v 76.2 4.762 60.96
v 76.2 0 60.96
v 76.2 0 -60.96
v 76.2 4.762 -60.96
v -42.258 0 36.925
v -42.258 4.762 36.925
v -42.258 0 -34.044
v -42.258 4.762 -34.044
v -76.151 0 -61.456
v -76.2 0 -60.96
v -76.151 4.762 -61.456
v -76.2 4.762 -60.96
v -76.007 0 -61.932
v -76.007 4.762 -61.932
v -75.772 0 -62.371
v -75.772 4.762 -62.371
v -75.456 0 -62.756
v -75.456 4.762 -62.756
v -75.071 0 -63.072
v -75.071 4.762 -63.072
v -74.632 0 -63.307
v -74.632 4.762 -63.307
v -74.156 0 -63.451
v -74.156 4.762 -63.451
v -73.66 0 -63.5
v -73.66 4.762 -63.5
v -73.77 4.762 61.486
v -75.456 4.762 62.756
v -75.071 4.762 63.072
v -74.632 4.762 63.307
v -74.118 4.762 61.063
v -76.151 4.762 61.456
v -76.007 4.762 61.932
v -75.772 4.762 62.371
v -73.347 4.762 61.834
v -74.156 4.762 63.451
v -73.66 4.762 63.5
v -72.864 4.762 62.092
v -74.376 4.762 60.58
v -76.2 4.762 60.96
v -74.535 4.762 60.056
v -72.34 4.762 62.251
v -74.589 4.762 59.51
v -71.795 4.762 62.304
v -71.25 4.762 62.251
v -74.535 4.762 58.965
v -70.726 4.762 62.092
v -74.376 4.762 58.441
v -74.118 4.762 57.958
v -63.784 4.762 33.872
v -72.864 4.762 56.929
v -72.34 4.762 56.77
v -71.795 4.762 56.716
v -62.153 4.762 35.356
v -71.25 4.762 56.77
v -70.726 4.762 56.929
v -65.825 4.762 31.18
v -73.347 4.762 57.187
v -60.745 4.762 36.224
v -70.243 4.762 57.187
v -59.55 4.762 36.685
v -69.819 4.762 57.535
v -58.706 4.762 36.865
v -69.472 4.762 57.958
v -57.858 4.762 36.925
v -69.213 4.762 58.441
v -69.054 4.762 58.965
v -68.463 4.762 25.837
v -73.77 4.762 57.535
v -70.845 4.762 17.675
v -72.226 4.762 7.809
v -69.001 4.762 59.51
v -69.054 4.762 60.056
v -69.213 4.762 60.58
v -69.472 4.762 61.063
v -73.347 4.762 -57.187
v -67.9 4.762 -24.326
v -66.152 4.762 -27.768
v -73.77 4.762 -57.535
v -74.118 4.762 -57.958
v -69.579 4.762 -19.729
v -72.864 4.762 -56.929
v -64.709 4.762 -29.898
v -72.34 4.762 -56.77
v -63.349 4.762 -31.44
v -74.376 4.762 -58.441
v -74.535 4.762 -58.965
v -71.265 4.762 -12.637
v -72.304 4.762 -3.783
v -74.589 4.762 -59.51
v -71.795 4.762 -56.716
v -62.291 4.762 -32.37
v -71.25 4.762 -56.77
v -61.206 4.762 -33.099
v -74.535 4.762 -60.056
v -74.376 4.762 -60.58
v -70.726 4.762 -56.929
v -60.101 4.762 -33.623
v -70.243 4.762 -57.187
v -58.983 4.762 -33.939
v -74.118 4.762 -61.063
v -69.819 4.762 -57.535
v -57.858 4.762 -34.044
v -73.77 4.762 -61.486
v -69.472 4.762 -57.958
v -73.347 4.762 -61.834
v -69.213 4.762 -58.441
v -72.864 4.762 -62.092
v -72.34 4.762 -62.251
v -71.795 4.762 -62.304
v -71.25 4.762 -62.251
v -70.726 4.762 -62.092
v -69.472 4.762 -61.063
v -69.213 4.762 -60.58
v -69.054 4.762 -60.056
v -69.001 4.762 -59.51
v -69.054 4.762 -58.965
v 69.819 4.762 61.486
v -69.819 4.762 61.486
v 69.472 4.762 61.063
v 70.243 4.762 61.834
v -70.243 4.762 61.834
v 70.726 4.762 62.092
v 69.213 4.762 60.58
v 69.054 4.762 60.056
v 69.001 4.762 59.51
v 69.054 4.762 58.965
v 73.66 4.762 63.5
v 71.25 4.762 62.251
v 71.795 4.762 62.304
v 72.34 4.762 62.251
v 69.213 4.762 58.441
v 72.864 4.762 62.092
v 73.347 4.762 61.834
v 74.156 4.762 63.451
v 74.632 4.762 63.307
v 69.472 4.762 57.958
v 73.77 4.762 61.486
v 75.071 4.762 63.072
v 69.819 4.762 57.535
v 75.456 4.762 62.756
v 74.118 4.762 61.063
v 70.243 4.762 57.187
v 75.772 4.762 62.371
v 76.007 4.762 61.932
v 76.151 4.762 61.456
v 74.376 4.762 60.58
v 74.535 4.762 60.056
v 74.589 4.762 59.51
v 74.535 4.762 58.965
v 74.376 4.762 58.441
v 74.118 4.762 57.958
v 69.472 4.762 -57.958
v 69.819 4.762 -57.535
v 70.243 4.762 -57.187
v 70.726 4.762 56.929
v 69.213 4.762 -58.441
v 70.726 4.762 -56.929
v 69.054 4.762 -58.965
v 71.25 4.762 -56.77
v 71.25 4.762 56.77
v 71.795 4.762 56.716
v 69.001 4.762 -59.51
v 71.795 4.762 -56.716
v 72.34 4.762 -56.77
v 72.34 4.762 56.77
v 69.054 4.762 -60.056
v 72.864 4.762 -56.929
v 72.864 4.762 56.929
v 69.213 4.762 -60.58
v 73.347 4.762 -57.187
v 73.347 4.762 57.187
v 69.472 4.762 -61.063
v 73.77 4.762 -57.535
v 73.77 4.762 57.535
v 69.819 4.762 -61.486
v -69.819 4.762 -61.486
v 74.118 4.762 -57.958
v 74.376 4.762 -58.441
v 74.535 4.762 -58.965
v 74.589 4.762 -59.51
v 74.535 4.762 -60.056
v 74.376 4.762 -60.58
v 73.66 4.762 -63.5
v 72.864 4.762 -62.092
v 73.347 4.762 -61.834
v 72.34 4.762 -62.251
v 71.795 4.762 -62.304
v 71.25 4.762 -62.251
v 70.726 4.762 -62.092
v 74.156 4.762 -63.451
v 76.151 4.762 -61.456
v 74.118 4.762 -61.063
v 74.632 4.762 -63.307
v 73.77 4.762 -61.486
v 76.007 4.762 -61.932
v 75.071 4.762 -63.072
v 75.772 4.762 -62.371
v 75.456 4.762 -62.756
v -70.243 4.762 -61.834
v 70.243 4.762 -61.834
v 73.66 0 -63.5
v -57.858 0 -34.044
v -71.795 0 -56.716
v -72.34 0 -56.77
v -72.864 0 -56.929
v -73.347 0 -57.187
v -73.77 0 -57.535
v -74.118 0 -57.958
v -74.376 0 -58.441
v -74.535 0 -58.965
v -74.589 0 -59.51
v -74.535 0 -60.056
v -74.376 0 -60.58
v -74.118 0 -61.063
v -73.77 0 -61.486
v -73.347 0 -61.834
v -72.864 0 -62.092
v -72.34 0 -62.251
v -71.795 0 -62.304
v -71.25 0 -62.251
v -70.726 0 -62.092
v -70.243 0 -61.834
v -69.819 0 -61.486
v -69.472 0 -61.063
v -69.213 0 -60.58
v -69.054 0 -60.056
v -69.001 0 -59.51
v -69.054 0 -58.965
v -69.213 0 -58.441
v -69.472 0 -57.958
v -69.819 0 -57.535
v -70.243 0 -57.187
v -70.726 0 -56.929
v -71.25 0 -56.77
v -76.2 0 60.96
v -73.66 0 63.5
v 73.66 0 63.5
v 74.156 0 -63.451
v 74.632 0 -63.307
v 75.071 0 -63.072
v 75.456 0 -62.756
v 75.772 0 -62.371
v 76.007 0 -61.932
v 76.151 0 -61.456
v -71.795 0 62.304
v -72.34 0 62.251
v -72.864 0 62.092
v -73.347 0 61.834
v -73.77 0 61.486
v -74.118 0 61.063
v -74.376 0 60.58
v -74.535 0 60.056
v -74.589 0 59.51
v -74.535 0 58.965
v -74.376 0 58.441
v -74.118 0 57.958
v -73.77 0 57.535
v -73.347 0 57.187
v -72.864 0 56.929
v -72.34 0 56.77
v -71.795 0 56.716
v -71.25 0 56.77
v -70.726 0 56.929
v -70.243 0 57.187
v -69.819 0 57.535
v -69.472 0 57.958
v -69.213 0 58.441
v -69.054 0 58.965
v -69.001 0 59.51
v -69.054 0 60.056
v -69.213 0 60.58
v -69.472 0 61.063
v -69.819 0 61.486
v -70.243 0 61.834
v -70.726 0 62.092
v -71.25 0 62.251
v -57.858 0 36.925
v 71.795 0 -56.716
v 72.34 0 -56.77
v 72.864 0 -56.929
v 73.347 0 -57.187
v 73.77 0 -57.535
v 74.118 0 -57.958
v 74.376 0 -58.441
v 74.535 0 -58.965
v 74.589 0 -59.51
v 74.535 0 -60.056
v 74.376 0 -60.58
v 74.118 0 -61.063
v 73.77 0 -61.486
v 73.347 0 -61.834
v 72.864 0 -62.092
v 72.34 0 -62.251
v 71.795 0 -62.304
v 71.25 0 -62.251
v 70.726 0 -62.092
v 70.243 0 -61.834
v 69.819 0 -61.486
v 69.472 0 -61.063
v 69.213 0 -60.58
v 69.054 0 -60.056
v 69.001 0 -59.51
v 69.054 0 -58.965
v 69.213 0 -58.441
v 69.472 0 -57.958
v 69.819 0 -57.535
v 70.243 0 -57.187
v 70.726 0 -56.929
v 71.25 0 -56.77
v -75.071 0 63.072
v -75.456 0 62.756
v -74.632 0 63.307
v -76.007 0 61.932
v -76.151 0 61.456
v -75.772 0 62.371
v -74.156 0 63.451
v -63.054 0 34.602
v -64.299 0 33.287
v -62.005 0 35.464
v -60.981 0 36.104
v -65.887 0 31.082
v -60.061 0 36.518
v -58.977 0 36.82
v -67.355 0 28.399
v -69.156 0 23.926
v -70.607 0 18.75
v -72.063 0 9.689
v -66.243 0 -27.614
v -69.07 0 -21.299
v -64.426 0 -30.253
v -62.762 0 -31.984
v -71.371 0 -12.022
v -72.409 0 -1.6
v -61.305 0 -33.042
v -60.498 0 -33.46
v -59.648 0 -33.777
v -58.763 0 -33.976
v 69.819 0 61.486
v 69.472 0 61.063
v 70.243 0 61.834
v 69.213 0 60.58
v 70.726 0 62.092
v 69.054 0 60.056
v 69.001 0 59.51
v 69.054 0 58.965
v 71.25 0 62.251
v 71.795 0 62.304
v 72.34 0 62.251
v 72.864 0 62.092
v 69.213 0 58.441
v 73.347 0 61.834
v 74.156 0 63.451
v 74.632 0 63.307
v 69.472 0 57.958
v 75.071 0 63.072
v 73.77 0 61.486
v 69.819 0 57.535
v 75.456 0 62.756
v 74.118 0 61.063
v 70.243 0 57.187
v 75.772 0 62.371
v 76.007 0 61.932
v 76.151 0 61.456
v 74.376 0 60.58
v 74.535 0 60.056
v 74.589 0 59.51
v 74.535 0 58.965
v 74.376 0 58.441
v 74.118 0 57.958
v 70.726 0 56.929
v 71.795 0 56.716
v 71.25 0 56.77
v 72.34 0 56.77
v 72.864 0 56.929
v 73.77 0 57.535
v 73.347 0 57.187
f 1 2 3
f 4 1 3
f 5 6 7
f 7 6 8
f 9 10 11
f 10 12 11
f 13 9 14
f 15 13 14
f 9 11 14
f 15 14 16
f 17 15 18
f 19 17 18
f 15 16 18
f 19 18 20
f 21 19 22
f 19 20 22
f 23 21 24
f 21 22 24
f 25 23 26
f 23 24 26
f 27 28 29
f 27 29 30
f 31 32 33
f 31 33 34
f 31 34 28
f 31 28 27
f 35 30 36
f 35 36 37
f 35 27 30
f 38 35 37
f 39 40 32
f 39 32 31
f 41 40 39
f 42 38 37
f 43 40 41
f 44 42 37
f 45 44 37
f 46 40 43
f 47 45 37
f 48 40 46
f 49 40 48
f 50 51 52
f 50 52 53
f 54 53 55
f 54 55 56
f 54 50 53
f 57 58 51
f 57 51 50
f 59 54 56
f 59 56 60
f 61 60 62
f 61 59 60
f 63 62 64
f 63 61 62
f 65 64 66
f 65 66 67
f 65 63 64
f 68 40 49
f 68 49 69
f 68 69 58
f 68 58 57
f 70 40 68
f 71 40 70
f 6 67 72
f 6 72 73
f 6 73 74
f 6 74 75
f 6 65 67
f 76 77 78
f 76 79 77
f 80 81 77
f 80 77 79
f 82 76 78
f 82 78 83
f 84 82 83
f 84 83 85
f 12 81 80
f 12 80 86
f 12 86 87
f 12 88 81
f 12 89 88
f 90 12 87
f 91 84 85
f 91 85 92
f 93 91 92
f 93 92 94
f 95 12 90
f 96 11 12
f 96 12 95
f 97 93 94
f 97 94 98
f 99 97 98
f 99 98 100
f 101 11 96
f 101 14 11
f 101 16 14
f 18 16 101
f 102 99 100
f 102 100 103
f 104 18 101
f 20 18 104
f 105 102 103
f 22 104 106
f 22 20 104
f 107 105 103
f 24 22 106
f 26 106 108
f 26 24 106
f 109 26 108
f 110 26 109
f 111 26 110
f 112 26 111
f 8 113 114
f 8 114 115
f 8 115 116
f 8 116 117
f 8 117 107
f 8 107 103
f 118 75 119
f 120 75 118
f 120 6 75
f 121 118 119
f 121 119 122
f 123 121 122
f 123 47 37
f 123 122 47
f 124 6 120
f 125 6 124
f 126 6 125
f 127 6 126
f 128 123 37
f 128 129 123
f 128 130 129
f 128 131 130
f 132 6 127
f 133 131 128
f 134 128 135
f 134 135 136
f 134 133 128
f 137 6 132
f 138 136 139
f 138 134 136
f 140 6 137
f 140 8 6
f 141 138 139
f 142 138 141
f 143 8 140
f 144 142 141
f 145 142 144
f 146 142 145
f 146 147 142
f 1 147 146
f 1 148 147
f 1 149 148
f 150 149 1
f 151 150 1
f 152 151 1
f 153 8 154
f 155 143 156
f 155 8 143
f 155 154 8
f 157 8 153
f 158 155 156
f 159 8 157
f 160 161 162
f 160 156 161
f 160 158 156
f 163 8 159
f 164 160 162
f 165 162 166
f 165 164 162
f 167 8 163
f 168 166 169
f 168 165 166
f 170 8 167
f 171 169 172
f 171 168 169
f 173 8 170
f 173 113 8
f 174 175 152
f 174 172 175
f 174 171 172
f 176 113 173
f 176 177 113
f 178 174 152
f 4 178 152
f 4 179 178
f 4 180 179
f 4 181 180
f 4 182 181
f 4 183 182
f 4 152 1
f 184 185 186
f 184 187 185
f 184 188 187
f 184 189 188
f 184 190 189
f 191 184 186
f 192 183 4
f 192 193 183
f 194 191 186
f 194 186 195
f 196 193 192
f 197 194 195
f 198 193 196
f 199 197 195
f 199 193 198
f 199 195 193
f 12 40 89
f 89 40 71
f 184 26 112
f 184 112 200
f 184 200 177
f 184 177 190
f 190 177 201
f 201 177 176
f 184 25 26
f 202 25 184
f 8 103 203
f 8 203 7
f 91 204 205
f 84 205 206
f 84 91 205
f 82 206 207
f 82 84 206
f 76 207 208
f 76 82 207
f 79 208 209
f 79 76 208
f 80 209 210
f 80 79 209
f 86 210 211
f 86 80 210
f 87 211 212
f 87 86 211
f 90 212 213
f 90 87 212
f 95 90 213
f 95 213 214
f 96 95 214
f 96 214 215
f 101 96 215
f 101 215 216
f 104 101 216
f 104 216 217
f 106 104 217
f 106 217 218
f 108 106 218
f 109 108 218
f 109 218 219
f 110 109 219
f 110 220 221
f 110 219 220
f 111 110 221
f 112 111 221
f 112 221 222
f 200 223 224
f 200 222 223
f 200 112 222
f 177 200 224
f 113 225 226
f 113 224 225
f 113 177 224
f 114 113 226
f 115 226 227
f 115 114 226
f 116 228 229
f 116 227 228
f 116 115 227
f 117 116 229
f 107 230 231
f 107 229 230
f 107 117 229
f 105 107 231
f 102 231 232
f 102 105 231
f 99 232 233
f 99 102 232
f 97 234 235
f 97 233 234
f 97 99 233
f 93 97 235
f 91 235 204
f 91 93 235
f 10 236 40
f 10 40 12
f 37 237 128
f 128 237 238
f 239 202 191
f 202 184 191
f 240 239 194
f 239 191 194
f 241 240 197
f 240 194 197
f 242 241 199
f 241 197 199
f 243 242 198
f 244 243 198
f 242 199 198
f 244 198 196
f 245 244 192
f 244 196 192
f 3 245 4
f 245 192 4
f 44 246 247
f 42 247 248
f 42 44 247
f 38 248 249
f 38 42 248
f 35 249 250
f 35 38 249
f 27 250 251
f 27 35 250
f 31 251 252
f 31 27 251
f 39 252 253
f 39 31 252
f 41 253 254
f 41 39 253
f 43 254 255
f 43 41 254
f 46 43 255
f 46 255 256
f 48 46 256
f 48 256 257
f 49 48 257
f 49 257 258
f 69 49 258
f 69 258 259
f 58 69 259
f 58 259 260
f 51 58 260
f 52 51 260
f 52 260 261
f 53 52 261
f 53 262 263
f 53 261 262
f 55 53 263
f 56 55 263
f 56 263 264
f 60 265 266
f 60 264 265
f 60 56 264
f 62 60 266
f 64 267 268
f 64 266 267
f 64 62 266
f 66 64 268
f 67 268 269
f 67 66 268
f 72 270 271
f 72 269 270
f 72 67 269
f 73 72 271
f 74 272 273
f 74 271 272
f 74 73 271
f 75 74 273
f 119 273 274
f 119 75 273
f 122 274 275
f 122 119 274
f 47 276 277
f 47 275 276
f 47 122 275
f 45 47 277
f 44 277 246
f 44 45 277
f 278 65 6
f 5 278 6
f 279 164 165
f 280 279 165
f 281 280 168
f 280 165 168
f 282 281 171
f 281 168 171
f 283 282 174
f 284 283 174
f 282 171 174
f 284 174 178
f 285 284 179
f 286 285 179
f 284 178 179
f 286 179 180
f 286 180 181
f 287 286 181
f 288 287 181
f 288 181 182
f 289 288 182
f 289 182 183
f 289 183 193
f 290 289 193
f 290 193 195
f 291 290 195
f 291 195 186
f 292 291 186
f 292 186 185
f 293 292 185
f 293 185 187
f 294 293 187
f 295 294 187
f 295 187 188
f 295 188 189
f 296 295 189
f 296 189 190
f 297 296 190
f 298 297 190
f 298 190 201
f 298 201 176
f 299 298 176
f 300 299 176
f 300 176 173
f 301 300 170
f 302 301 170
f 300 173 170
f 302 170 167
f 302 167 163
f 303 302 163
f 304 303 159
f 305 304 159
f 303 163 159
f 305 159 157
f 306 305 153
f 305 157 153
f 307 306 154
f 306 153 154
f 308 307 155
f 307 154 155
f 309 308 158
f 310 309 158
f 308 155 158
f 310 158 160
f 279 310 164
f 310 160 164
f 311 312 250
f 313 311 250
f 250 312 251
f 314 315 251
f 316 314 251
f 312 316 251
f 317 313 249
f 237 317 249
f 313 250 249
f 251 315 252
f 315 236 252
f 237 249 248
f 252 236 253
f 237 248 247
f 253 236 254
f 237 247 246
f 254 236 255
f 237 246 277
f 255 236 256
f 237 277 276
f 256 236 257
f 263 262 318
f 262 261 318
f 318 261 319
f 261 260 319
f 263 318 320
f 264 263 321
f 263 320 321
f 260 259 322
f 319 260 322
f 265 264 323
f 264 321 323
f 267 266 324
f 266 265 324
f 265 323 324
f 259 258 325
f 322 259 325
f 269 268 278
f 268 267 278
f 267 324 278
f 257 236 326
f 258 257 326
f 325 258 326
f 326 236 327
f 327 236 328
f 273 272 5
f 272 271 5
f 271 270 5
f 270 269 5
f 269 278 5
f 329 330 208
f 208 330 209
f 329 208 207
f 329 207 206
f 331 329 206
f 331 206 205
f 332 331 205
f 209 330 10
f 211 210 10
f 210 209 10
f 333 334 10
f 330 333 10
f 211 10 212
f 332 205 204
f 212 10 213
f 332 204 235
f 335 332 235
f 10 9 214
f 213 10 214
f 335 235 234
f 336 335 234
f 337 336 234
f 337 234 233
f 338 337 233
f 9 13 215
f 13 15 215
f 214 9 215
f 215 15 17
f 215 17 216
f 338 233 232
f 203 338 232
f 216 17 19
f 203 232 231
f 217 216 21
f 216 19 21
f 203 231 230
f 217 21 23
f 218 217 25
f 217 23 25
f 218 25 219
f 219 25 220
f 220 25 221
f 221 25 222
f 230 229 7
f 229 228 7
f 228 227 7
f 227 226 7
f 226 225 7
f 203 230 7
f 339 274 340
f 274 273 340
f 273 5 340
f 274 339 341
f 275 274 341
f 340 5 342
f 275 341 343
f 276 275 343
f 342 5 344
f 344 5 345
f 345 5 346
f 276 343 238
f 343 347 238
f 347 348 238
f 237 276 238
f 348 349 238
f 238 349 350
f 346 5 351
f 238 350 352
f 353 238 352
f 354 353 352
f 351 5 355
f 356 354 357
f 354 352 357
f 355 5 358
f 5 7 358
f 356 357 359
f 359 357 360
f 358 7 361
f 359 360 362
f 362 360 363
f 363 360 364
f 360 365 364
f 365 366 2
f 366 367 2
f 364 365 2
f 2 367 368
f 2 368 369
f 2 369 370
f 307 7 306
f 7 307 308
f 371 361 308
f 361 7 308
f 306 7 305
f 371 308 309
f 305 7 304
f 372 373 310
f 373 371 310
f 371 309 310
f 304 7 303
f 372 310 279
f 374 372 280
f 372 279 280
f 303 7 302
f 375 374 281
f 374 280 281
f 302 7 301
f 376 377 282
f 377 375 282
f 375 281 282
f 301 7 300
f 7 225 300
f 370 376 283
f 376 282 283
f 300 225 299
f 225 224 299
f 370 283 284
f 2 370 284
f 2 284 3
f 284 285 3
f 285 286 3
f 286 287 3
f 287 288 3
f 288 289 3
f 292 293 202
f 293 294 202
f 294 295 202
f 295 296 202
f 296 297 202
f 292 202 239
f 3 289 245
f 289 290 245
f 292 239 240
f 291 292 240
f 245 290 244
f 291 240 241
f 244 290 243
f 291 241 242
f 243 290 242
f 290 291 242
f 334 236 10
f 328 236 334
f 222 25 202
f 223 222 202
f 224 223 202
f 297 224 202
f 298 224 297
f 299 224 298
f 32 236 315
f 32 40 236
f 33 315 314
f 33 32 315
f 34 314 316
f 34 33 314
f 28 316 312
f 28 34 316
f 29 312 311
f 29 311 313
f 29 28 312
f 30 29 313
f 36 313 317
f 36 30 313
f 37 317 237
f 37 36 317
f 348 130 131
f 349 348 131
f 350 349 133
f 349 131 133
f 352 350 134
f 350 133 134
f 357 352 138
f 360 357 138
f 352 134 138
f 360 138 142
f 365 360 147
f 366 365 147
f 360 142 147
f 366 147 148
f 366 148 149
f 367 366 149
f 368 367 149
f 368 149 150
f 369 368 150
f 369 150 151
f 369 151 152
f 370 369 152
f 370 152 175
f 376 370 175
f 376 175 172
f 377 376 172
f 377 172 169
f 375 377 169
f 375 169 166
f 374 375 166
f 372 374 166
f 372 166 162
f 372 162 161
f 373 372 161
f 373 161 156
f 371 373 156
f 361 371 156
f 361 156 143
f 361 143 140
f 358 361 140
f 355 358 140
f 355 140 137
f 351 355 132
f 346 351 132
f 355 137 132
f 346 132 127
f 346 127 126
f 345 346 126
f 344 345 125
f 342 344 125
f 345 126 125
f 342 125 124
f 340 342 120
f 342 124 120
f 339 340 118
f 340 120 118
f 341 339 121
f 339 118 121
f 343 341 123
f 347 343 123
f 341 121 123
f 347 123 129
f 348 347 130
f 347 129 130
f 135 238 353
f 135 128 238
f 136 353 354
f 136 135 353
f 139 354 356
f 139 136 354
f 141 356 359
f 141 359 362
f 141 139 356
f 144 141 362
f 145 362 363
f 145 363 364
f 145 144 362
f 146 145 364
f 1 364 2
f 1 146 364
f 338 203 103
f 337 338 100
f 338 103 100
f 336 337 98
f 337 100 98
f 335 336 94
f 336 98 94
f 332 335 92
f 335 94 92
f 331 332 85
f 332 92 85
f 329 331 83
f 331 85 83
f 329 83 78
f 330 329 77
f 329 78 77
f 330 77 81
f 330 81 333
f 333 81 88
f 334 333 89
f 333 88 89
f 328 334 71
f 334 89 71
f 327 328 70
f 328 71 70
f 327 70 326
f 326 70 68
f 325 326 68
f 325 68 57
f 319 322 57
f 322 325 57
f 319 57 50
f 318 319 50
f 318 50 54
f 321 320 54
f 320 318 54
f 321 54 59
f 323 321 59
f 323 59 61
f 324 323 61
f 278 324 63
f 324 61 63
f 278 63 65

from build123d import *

# Parameters (mm, degrees)
SKETCH1_W           = 152.4
SKETCH1_H           = 127
BOSS_EXTRUDE1_DEPTH = 4.7625
SKETCH2_R           = 2.794
CUT_EXTRUDE1_DEPTH  = 100.304437999
FILLET1_R           = 2.54
SKETCH4_W           = 15.599974926
SKETCH4_H           = 70.968900013
CUT_EXTRUDE2_DEPTH  = 100.304437999
SKETCH5_RX          = 35.484450006
SKETCH5_RY          = 14.605
CUT_EXTRUDE3_DEPTH  = 100.304437999


with BuildPart() as part:
    # Sketch1 → Boss-Extrude1 (new body)
    with BuildSketch(Plane(origin=(0, 0, 0), x_dir=(1, 0, 0), z_dir=(0, 1, 0))):
        Rectangle(SKETCH1_W, SKETCH1_H)
    extrude(amount=BOSS_EXTRUDE1_DEPTH)

    # Sketch2 → Cut-Extrude1 (cut, through all)
    with BuildSketch(Plane(origin=(0, 4.7625, 0), x_dir=(1, 0, 0), z_dir=(0, 1, 0))):
        with Locations(Location((71.794813785, -59.510435834, 0), (0, 0, 270))):
            Circle(SKETCH2_R)
        with Locations(Location((71.794813785, 59.510435834, 0), (0, 0, 270))):
            Circle(SKETCH2_R)
    cut_extrude1 = extrude(amount=-CUT_EXTRUDE1_DEPTH, mode=Mode.SUBTRACT)

    # Mirror1: Cut-Extrude1 across plane
    add(cut_extrude1.mirror(Plane(origin=(0, 0, 0), x_dir=(0, 0, 1), z_dir=(1, 0, 0))), mode=Mode.SUBTRACT)

    # Fillet1
    fillet1_edges = [part.edges().sort_by_distance(p)[0] for p in [
        (76.2, 2.38125, 63.5),
        (-76.2, 2.38125, 63.5),
        (-76.2, 2.38125, -63.5),
        (76.2, 2.38125, -63.5),
    ]]
    fillet(fillet1_edges, radius=FILLET1_R)

    # Sketch4 → Cut-Extrude2 (cut, through all)
    with BuildSketch(Plane(origin=(0, 4.7625, 0), x_dir=(1, 0, 0), z_dir=(0, 1, 0))):
        with Locations((-50.05790393, -1.440073651)):
            Rectangle(SKETCH4_W, SKETCH4_H)
    extrude(amount=-CUT_EXTRUDE2_DEPTH, mode=Mode.SUBTRACT)

    # Sketch5 → Cut-Extrude3 (cut, through all)
    with BuildSketch(Plane(origin=(0, 4.7625, 0), x_dir=(1, 0, 0), z_dir=(0, 1, 0))):
        with Locations(Location((-57.857891393, -1.44007365), (0, 0, -90))):
            Ellipse(SKETCH5_RX, SKETCH5_RY)
    extrude(amount=-CUT_EXTRUDE3_DEPTH, mode=Mode.SUBTRACT)


solid = part.part
